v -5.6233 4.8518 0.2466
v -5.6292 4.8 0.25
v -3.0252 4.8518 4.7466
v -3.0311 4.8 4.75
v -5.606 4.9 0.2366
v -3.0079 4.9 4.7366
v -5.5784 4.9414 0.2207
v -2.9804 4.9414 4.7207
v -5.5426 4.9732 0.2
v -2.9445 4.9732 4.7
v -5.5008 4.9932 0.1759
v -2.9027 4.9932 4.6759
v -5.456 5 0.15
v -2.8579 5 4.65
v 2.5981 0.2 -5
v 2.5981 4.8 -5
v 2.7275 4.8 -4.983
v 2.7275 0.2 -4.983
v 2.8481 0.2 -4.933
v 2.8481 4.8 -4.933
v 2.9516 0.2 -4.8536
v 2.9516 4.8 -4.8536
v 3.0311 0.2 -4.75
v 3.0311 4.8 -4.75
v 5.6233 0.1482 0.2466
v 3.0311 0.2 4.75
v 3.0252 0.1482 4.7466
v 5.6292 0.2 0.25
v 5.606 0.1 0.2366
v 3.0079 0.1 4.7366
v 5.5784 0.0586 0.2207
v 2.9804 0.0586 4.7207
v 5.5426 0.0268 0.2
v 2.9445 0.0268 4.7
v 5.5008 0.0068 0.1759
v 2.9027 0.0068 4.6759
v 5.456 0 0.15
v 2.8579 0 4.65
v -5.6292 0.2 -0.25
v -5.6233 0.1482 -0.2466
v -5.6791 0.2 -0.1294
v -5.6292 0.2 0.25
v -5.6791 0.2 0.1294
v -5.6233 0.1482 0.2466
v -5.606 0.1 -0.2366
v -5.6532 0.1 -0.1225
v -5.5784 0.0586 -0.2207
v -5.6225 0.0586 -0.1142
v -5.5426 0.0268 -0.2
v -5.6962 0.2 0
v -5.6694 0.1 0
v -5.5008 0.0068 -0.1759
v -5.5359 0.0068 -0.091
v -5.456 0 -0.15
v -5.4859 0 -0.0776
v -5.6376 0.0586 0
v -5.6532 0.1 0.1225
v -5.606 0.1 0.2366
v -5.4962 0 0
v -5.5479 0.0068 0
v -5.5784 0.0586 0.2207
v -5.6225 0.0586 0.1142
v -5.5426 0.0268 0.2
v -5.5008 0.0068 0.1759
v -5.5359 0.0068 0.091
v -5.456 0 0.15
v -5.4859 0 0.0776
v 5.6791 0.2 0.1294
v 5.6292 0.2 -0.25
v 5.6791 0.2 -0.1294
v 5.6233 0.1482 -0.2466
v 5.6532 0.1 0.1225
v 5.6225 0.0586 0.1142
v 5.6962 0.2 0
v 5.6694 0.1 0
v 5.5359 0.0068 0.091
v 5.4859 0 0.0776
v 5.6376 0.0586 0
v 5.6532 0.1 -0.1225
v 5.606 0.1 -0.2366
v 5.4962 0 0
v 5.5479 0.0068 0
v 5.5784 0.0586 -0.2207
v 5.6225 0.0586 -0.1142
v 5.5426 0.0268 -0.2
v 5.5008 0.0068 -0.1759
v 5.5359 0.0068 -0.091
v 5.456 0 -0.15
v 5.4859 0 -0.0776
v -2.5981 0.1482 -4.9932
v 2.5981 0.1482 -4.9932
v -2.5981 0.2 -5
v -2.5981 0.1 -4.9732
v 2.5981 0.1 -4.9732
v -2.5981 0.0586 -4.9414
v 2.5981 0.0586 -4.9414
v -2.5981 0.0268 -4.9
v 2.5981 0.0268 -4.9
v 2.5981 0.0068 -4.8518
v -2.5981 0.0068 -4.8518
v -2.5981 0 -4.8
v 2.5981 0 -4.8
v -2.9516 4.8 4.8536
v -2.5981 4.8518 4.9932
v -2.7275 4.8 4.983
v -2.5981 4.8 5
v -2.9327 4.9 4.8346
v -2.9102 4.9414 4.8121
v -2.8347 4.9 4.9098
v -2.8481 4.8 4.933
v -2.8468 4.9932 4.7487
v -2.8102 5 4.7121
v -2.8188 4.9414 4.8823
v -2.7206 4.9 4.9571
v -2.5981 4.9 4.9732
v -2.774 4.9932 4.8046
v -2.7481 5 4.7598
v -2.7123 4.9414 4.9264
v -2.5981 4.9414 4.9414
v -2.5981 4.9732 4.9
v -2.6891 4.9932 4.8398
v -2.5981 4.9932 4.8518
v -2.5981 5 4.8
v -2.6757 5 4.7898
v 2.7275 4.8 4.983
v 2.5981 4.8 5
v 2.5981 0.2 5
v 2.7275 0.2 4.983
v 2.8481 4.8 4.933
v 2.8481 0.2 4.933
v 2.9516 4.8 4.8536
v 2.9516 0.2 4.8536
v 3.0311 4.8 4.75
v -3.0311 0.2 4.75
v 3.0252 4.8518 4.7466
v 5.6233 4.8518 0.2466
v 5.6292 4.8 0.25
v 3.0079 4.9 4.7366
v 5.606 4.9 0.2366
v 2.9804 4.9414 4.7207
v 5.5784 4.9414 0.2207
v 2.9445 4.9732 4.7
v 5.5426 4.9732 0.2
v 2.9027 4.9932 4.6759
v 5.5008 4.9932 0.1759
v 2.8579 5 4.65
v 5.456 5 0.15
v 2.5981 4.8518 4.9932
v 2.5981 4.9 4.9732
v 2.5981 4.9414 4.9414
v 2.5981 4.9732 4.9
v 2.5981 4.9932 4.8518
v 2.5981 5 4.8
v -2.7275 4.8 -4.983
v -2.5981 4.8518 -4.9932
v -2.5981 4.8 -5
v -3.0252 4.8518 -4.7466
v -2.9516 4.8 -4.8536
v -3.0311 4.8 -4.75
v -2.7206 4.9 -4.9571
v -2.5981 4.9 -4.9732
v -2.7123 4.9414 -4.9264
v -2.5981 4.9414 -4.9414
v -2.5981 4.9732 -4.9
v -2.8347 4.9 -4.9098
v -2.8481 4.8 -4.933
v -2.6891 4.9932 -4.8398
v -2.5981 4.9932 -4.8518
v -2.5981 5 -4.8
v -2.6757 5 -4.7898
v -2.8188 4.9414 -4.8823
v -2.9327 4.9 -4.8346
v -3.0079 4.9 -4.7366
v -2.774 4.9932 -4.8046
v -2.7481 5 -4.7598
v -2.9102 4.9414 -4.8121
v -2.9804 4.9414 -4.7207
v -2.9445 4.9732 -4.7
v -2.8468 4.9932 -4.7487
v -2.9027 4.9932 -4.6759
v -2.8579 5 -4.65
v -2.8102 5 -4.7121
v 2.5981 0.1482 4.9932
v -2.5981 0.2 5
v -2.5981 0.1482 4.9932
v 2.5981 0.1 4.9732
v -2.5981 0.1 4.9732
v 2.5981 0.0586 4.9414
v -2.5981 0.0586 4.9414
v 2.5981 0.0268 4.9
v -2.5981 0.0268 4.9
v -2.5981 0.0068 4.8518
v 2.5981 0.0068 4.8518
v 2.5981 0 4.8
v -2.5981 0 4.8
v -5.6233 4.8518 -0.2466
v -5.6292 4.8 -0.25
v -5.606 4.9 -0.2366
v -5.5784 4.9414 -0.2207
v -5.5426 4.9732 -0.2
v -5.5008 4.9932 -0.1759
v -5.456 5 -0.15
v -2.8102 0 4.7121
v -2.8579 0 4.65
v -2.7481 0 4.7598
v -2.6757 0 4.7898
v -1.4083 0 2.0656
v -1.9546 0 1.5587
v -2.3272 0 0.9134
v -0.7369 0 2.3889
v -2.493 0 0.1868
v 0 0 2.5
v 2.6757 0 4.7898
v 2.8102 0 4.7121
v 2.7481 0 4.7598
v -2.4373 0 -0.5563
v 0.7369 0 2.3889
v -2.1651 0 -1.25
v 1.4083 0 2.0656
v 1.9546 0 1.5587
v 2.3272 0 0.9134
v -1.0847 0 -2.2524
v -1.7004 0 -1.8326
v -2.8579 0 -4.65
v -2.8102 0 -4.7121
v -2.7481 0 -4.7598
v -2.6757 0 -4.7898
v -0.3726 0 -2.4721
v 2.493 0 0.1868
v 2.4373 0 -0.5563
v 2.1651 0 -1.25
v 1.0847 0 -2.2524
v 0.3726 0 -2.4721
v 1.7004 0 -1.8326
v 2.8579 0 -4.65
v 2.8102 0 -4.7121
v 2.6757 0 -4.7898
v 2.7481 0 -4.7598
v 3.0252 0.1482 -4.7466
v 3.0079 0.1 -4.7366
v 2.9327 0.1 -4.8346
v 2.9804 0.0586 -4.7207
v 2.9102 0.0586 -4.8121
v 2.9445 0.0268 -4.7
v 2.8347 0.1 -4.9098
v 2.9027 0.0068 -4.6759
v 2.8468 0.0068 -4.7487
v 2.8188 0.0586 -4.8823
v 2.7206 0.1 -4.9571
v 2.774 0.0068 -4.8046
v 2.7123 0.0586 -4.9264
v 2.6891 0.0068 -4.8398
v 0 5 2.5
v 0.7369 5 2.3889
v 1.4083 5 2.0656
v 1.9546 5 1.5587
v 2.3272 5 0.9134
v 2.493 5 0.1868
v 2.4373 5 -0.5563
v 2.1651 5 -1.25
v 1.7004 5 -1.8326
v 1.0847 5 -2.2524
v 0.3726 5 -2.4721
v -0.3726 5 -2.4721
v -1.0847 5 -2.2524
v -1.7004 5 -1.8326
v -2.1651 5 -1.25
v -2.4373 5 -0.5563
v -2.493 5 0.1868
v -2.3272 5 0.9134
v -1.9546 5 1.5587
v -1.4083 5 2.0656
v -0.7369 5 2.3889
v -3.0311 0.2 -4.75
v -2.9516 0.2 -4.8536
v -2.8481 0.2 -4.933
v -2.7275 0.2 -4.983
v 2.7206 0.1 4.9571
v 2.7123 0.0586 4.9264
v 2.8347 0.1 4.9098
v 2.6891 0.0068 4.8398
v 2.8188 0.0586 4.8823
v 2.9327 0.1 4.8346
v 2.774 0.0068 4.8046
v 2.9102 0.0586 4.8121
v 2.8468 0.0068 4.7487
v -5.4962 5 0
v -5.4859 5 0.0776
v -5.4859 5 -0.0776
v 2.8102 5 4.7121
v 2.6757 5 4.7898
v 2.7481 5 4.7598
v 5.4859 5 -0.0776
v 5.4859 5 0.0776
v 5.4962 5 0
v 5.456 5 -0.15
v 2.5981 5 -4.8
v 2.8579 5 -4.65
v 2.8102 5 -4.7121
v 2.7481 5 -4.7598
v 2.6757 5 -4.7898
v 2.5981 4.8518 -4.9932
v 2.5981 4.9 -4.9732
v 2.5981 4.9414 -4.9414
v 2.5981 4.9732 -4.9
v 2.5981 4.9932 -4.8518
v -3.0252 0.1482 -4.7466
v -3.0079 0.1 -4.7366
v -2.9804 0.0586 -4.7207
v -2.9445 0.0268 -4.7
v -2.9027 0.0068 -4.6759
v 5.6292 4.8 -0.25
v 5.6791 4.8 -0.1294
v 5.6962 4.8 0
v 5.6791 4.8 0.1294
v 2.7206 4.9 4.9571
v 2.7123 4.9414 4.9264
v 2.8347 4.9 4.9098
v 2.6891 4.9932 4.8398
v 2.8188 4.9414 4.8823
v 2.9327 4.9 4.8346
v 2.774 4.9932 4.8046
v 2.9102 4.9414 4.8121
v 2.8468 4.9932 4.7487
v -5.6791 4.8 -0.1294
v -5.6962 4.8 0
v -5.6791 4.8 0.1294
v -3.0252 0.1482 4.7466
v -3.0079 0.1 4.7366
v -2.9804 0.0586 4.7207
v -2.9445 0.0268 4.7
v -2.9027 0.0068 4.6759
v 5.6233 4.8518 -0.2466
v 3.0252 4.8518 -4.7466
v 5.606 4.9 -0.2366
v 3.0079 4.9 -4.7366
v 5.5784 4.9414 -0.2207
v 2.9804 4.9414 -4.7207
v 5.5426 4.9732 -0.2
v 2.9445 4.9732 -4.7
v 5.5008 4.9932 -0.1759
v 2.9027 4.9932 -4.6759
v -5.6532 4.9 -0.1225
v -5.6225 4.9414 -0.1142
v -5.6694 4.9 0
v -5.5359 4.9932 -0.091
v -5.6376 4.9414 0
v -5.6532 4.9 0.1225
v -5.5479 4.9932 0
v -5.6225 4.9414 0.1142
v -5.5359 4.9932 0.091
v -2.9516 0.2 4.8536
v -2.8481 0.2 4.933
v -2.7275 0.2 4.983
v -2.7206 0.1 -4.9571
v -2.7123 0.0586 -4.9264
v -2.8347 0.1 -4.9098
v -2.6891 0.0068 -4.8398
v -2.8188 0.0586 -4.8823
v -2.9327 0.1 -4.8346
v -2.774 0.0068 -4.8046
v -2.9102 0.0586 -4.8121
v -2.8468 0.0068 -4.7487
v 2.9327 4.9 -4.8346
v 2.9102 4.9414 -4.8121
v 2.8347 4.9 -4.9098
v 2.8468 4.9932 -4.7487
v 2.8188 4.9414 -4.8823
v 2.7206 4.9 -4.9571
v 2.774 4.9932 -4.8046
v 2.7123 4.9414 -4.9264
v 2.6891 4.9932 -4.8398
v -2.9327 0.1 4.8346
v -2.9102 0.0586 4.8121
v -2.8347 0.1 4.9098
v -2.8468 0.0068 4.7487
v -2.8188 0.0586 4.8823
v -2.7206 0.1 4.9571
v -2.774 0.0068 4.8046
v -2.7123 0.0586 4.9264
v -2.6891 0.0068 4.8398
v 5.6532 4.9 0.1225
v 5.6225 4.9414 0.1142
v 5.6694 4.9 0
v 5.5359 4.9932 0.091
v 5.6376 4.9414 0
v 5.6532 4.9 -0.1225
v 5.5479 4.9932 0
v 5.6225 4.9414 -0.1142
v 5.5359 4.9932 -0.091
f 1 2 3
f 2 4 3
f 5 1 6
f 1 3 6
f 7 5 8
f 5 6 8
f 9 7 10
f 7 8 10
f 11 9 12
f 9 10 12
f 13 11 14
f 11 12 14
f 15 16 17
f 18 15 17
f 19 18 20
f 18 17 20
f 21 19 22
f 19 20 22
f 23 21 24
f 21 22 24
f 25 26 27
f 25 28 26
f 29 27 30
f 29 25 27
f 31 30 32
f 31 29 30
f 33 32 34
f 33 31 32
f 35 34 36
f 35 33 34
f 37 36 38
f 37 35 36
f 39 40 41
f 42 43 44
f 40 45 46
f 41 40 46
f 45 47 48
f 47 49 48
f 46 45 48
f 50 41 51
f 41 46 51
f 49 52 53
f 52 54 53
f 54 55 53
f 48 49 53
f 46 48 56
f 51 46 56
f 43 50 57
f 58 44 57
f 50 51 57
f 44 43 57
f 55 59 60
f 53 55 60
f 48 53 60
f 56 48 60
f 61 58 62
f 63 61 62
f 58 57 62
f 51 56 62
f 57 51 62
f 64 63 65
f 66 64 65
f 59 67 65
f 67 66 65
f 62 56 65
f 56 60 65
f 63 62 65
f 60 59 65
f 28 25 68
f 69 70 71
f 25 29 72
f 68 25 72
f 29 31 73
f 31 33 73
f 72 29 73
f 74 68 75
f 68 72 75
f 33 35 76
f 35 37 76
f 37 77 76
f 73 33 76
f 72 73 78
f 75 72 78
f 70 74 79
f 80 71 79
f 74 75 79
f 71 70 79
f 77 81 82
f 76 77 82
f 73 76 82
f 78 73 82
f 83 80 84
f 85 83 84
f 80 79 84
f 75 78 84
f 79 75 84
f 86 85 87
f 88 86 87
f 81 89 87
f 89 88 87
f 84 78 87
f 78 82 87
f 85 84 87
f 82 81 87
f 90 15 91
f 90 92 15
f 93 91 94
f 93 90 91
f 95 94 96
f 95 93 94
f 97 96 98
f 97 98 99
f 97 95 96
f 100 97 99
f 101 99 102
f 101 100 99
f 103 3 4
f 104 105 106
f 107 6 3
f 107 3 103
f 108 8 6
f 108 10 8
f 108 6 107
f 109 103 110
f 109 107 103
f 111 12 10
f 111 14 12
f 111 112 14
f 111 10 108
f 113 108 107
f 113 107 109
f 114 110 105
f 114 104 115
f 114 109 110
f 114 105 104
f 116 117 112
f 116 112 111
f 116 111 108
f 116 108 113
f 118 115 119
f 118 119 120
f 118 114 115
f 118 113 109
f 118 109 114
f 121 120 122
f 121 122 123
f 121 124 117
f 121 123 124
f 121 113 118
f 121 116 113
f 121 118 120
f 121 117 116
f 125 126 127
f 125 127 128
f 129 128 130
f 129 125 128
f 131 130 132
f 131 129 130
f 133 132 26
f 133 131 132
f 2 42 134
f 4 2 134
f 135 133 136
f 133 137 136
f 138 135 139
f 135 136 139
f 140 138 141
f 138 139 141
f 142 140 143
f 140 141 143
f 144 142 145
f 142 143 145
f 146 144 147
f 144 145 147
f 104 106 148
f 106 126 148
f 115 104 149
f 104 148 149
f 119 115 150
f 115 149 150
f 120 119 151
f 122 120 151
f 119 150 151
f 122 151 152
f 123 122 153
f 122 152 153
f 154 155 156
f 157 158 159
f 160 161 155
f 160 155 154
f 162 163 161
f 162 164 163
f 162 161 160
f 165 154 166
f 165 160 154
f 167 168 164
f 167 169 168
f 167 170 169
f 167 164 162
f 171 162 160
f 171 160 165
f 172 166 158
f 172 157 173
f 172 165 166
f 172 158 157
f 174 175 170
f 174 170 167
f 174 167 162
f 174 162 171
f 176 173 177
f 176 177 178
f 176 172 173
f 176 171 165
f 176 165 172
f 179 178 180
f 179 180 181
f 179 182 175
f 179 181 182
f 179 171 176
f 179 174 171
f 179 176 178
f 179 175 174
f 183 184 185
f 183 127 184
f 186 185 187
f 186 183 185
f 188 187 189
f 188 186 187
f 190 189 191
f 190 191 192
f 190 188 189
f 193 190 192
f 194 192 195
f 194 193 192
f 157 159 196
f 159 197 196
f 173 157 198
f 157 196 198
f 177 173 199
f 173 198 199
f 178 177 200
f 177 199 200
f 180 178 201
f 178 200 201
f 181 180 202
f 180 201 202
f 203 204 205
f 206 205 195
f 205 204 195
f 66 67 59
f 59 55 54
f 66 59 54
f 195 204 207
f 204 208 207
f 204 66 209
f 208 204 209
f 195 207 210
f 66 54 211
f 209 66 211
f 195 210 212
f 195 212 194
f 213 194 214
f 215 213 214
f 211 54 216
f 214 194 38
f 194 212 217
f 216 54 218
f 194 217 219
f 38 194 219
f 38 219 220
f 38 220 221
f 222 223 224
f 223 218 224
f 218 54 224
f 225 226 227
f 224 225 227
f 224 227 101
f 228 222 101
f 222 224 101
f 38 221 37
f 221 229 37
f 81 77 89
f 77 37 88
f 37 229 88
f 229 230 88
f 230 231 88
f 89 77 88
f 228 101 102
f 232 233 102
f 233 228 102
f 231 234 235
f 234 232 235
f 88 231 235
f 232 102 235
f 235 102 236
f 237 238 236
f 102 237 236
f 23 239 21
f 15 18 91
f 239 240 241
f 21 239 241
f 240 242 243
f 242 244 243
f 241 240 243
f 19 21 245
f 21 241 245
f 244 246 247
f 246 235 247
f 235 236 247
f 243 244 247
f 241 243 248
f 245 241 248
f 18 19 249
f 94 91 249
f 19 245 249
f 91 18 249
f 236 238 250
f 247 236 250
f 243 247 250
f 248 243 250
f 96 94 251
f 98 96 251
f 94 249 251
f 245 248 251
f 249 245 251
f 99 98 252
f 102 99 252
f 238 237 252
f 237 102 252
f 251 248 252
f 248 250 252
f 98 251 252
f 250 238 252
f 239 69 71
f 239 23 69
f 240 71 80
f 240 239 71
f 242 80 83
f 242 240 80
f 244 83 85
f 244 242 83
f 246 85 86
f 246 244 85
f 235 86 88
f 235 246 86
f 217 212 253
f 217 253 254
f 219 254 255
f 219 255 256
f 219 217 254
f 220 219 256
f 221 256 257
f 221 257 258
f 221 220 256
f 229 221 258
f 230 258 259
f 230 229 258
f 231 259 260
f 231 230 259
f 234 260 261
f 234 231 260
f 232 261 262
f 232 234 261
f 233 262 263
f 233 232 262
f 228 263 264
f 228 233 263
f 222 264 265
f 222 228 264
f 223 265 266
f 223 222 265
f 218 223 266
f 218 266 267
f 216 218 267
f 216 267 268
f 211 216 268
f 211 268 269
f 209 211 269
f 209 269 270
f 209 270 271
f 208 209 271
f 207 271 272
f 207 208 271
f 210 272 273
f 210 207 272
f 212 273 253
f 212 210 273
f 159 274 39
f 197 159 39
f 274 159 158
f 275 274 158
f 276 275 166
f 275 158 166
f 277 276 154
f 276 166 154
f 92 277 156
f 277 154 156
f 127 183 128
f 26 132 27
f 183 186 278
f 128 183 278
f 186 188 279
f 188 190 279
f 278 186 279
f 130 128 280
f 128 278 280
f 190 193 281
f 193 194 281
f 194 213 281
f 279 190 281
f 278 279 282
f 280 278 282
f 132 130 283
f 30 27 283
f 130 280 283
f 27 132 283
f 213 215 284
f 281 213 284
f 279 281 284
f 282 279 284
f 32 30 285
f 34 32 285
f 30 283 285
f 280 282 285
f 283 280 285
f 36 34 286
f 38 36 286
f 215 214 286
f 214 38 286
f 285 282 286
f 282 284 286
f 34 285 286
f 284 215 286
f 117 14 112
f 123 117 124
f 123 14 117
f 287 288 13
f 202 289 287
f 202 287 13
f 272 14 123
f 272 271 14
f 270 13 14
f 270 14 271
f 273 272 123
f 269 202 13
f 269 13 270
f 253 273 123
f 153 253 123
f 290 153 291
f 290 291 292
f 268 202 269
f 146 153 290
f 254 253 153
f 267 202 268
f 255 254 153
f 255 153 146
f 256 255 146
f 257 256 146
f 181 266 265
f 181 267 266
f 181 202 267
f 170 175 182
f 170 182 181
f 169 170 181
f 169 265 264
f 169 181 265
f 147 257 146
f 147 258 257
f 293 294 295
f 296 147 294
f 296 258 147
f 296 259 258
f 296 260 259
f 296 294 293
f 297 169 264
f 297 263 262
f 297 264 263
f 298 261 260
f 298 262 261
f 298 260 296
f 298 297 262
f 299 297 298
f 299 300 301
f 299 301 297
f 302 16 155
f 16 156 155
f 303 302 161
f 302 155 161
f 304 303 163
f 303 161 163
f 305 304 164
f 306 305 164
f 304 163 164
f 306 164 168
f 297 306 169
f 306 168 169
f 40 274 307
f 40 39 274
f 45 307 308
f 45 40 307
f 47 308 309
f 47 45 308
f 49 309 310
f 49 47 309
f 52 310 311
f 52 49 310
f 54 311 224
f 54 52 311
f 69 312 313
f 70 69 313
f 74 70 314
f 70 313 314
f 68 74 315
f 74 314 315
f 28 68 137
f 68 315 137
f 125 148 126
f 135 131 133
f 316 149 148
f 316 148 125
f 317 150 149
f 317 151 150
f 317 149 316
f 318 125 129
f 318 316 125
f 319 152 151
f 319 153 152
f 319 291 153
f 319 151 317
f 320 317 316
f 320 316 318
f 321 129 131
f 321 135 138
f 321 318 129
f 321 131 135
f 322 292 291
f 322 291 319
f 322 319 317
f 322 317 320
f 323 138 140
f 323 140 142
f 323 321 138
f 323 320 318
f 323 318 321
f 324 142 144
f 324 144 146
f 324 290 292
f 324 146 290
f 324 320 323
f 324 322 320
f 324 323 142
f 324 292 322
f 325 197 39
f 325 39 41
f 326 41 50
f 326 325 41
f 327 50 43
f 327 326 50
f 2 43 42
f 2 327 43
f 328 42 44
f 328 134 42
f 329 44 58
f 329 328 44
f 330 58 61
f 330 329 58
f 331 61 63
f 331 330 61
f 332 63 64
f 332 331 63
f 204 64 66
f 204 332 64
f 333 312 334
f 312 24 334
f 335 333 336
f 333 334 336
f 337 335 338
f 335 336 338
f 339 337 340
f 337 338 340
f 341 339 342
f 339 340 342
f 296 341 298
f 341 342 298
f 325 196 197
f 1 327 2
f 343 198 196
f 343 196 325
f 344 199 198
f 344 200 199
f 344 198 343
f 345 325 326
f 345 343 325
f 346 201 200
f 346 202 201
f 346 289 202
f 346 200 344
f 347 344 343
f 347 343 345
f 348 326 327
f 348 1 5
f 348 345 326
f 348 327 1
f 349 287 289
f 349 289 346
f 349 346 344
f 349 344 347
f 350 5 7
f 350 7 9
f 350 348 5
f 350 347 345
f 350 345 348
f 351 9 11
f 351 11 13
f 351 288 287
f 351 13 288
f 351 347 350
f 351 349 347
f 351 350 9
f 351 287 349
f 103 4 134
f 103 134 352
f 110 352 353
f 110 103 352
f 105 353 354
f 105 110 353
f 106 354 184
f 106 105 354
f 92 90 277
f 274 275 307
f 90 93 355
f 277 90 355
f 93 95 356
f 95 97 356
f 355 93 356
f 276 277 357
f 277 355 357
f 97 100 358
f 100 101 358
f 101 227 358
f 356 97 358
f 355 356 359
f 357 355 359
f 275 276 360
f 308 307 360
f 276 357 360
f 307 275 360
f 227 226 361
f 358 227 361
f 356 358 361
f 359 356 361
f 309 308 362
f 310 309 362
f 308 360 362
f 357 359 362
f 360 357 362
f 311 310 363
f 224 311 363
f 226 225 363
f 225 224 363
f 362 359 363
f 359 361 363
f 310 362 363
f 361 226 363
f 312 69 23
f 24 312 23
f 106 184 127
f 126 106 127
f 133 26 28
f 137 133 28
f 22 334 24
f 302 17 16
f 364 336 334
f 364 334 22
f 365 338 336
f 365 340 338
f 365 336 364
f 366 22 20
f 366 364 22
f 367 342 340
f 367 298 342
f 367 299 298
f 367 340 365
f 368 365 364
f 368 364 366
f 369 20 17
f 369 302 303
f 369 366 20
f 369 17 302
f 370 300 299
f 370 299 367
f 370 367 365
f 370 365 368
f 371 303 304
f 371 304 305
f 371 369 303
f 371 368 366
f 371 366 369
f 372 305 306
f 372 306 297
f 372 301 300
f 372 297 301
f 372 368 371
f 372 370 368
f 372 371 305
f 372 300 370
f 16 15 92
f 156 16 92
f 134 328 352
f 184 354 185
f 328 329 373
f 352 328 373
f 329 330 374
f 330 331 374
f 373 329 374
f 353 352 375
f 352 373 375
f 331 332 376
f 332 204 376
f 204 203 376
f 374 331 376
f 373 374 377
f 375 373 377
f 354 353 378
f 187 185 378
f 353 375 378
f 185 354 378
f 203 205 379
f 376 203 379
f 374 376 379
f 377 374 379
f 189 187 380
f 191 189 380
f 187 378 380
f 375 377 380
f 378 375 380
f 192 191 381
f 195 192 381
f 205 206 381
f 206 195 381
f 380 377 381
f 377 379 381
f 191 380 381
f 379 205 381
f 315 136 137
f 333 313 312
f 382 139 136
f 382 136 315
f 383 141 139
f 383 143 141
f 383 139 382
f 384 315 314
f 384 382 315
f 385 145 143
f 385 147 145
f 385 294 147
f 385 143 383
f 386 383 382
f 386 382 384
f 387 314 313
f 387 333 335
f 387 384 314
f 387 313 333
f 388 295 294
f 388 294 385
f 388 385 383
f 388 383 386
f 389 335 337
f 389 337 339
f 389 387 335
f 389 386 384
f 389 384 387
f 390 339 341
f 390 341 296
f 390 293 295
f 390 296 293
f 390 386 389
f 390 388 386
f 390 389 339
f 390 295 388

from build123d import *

# Parameters (mm, degrees)
CROQUIS1_R              = 2.5
SALIENTE_EXTRUIR1_DEPTH = 5
REDONDEO1_R             = 0.5
REDONDEO2_R             = 0.2


with BuildPart() as part:
    # Croquis1 → Saliente-Extruir1 (new body)
    with BuildSketch(Plane(origin=(0, 0, 0), x_dir=(1, 0, 0), z_dir=(0, 1, 0))):
        Polygon((-2.886751346, 5), (-5.773502692, 0), (-2.886751346, -5), (2.886751346, -5), (5.773502692, 0), (2.886751346, 5), align=None)
        with Locations(Location((0, 0, 0), (0, 0, 270))):
            Circle(CROQUIS1_R, mode=Mode.SUBTRACT)
    extrude(amount=SALIENTE_EXTRUIR1_DEPTH)

    # Redondeo1
    redondeo1_edges = [part.edges().sort_by_distance(p)[0] for p in [
        (2.886751346, 2.5, -5),
        (5.773502692, 2.5, 0),
        (2.886751346, 2.5, 5),
        (-2.886751346, 2.5, 5),
        (-5.773502692, 2.5, 0),
        (-2.886751346, 2.5, -5),
    ]]
    fillet(redondeo1_edges, radius=REDONDEO1_R)

    # Redondeo2
    redondeo2_edges = [part.edges().sort_by_distance(p)[0] for p in [
        (-4.330127019, 0, -2.5),
        (-4.330127019, 5, -2.5),
        (0, 0, -5),
        (4.330127019, 0, -2.5),
        (4.330127019, 0, 2.5),
        (0, 0, 5),
        (-4.330127019, 0, 2.5),
        (-2.848076211, 0, 4.933012702),
        (-5.696152423, 0, 0),
        (2.848076211, 0, 4.933012702),
        (5.696152423, 0, 0),
        (2.848076211, 0, -4.933012702),
        (-2.848076211, 0, -4.933012702),
        (0, 5, -5),
        (-4.330127019, 5, 2.5),
        (0, 5, 5),
        (4.330127019, 5, 2.5),
        (4.330127019, 5, -2.5),
        (-2.848076211, 5, 4.933012702),
        (-5.696152423, 5, 0),
        (2.848076211, 5, 4.933012702),
        (5.696152423, 5, 0),
        (2.848076211, 5, -4.933012702),
        (-2.848076211, 5, -4.933012702),
    ]]
    fillet(redondeo2_edges, radius=REDONDEO2_R)


solid = part.part
